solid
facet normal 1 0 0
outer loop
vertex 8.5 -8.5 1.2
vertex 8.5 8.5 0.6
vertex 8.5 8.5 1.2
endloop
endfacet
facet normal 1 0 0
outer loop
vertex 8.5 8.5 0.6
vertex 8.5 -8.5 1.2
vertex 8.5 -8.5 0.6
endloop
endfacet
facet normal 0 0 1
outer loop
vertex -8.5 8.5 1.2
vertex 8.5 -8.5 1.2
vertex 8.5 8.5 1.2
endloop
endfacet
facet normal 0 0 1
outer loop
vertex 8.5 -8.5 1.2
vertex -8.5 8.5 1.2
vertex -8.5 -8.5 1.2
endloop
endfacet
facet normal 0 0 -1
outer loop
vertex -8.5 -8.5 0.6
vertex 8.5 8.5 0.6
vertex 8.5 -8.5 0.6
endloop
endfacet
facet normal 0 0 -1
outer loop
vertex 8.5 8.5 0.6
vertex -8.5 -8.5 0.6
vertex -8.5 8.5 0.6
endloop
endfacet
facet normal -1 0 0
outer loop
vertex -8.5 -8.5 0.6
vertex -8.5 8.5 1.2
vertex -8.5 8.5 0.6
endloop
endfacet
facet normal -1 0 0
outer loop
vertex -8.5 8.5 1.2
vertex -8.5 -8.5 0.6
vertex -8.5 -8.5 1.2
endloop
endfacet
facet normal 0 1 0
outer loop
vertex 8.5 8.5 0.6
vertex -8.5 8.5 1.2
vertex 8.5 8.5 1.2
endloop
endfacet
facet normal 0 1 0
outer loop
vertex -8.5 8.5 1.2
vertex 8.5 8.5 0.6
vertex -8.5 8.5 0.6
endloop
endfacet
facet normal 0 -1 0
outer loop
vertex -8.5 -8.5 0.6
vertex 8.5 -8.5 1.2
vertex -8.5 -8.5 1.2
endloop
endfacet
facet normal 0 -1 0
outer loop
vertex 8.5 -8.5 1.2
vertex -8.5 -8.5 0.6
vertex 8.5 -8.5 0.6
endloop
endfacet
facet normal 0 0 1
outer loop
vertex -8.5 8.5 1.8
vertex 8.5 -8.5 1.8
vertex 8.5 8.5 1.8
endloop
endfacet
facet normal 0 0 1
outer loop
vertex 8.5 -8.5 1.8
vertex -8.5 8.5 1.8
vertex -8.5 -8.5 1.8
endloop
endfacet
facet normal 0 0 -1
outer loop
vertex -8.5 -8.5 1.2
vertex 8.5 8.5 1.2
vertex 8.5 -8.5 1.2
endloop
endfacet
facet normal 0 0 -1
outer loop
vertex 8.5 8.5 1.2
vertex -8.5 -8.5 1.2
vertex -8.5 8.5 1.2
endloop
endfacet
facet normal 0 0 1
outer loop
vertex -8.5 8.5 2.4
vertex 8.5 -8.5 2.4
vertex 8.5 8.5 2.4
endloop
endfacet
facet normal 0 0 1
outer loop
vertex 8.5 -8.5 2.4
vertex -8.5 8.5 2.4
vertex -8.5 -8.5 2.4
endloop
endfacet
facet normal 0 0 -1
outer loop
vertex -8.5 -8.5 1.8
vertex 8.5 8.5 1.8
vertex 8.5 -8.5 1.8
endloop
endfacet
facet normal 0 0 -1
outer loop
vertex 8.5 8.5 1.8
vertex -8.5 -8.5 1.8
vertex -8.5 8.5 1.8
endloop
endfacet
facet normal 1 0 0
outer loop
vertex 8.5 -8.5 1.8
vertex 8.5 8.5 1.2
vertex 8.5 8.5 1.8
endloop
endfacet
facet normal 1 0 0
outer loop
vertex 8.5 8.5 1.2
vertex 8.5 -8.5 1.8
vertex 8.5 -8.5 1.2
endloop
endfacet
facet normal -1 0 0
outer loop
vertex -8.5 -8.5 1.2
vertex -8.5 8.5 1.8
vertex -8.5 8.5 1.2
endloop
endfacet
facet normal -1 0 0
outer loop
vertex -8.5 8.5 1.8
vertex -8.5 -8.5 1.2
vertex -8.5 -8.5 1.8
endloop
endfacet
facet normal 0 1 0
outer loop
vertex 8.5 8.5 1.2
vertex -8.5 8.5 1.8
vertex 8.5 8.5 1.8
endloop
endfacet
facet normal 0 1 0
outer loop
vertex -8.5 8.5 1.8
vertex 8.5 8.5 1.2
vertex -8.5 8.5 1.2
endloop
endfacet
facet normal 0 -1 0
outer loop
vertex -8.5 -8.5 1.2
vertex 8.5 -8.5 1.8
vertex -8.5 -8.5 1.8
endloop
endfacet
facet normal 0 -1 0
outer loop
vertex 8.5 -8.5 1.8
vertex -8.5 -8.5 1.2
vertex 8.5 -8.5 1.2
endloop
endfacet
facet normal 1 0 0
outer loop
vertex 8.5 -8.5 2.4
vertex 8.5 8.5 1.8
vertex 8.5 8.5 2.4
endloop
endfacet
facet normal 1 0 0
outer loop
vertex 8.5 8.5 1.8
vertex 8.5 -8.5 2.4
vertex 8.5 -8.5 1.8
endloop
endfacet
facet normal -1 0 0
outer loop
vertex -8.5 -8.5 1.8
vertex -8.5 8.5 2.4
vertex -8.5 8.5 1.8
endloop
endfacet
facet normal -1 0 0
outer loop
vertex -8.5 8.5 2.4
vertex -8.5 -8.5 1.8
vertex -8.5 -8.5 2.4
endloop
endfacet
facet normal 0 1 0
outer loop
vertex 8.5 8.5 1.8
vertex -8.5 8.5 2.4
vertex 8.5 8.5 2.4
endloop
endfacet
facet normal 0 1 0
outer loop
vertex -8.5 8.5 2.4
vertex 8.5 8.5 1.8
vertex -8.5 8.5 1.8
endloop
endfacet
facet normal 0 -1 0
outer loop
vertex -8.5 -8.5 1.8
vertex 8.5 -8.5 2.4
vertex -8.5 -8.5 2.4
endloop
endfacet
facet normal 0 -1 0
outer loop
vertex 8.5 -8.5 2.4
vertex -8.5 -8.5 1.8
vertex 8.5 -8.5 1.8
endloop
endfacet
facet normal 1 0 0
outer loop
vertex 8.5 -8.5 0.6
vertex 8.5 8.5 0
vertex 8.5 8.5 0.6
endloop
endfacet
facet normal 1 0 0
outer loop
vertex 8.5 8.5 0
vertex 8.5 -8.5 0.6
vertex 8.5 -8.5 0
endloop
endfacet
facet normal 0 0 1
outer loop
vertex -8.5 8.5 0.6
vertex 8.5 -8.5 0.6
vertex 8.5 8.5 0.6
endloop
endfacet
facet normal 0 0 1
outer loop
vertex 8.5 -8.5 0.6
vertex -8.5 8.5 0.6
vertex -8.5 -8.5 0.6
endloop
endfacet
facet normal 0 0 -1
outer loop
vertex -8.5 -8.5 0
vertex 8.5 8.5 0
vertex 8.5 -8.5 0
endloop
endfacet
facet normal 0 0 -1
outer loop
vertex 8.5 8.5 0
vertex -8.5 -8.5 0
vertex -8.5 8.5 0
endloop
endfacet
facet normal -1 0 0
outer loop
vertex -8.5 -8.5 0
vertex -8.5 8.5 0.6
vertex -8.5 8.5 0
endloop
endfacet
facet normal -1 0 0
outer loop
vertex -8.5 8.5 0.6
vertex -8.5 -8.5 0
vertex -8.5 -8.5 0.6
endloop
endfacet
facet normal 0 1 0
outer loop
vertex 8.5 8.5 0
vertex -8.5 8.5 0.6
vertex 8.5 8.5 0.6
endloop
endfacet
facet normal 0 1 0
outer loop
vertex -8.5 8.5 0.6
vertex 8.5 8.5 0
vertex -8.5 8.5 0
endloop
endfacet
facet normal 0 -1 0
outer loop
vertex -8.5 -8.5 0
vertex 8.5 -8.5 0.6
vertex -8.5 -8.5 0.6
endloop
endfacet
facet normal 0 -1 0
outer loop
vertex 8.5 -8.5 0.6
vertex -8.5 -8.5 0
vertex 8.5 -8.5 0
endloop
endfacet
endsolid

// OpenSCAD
//$fn = 20;

layer0Thickness = 0.6;
layer1Thickness = 0.6;
layer2Thickness = 0.6;
layer3Thickness = 0.6;

module allFill(primaryChar, secondaryChar, tertiaryChar, size, thickness) {
    intersection()  {
        sheet(size, thickness);
        character(primaryChar, size, thickness);
        character(secondaryChar, size, thickness);
    }
}

module secondaryFill(primaryChar, secondaryChar, tertiaryChar, size, thickness) {
    intersection() {
        sheet(size, thickness);
        difference() {
            difference() {
                character(secondaryChar, size, thickness);
                tertiaryFill(primaryChar, secondaryChar, tertiaryChar, size, thickness);
            }
            allFill(primaryChar, secondaryChar, tertiaryChar, size, thickness);
        }
    }
}

module tertiaryFill(primaryChar, secondaryChar, tertiaryChar, size, thickness) {
    difference() {
        intersection()  {
            sheet(size, thickness);
            character(secondaryChar, size, thickness);
            character(tertiaryChar, size, thickness);
        }
        allFill(primaryChar, secondaryChar, tertiaryChar, size, thickness);
    }
}

module sheet(size=5, thickness=0.3) {
    translate([-size/2,-size/2,0]) cube([size,size,thickness], center=false);
}

module character(char, size, thickness) {
    translate([0,(size-charSize)/2 - size/20,-thickness/2]) {
            linear_extrude(height=thickness*2, convexity=4) 
                text(char, 
                     size=charSize,
                     font="Bitstream Vera Sans",
                     halign="center",
                     valign="center");
        }
}

module cyan(primaryChar, secondaryChar, tertiaryChar, size) {
    union() {
        if(renderLayer1) translate([0,0,layer0Thickness]) difference() {
            sheet(size, layer1Thickness);
            character(secondaryChar, size, layer1Thickness);
        }
        
        if(renderLayer2) translate([0,0,layer0Thickness + layer1Thickness]) {
            tertiaryFill(secondaryChar, tertiaryChar, primaryChar, size, layer2Thickness);
        }

        if(renderLayer3) translate([0,0,layer0Thickness + layer1Thickness + layer2Thickness]) {
            secondaryFill(tertiaryChar, primaryChar, secondaryChar, size, layer3Thickness);
        }
    }
}

module magenta(primaryChar, secondaryChar, tertiaryChar, size) {
    union() {
        if(renderLayer1) translate([0,0,layer0Thickness]) {
            secondaryFill(primaryChar, secondaryChar, tertiaryChar, size, layer1Thickness);
        }

        if(renderLayer2) translate([0,0,layer0Thickness + layer1Thickness]) difference() {
            sheet(size, layer2Thickness);
            character(tertiaryChar, size, layer2Thickness);
        }

        if(renderLayer3) translate([0,0,layer0Thickness + layer1Thickness + layer2Thickness]) {
            tertiaryFill(tertiaryChar, primaryChar, secondaryChar, size, layer3Thickness);
        }
    }
}

module yellow(primaryChar, secondaryChar, tertiaryChar, size) {
    union() {
        if(renderLayer1) translate([0,0,layer0Thickness]) {
            tertiaryFill(primaryChar, secondaryChar, tertiaryChar, size, layer1Thickness);
        }

        if(renderLayer2) translate([0,0,layer0Thickness + layer1Thickness]) {
            secondaryFill(secondaryChar, tertiaryChar, primaryChar, size, layer2Thickness);
        }
        if(renderLayer3) translate([0,0,layer0Thickness + layer1Thickness + layer2Thickness]) difference() {
            sheet(size, layer3Thickness);
            character(primaryChar, size, layer3Thickness);
        }
    }
}

module white(primaryChar, secondaryChar, tertiaryChar, size) {
    union() {
        if(renderLayer0) translate([0,0,0]) sheet(size, layer0Thickness);
        
        if(renderLayer1) translate([0,0,layer0Thickness]) {
            allFill(primaryChar, secondaryChar, tertiaryChar, size, layer1Thickness);
        }
        
        if(renderLayer2) translate([0,0,layer0Thickness+layer1Thickness]) difference() {
            allFill(secondaryChar, tertiaryChar, primaryChar, size, layer2Thickness);
        }    
        
       if(renderLayer3) translate([0,0,layer0Thickness+layer1Thickness+layer2Thickness]) {
            allFill(tertiaryChar, primaryChar, secondaryChar, size, layer3Thickness);
        }
    }
}

size = 17;
charSize = 5;
renderLayer0 = true;
renderLayer1 = true;
renderLayer2 = true;
renderLayer3 = true;
showAll = true;
chromaphane = "a";

if(!showAll) {
    intersection() {
        union() {
            color("cyan") render()       cyan("W", "%", "7", size);
            color("magenta") render() magenta("W", "%", "7", size);
            color("yellow") render()   yellow("W", "%", "7", size);
            color("white") render()     white("W", "%", "7", size);
        }
        color("lime") render() character("%", size, 2);
    }
}

if(showAll) {
    if(chromaphane == "a" || chromaphane == "c") color("cyan") render()       cyan("W", "%", "7", size);
    if(chromaphane == "a" || chromaphane == "m") color("magenta") render() magenta("W", "%", "7", size);
    if(chromaphane == "a" || chromaphane == "y") color("yellow") render()   yellow("W", "%", "7", size);
    if(chromaphane == "a" || chromaphane == "w") color("white") render()     white("W", "%", "7", size);
}
echo(version=version());
